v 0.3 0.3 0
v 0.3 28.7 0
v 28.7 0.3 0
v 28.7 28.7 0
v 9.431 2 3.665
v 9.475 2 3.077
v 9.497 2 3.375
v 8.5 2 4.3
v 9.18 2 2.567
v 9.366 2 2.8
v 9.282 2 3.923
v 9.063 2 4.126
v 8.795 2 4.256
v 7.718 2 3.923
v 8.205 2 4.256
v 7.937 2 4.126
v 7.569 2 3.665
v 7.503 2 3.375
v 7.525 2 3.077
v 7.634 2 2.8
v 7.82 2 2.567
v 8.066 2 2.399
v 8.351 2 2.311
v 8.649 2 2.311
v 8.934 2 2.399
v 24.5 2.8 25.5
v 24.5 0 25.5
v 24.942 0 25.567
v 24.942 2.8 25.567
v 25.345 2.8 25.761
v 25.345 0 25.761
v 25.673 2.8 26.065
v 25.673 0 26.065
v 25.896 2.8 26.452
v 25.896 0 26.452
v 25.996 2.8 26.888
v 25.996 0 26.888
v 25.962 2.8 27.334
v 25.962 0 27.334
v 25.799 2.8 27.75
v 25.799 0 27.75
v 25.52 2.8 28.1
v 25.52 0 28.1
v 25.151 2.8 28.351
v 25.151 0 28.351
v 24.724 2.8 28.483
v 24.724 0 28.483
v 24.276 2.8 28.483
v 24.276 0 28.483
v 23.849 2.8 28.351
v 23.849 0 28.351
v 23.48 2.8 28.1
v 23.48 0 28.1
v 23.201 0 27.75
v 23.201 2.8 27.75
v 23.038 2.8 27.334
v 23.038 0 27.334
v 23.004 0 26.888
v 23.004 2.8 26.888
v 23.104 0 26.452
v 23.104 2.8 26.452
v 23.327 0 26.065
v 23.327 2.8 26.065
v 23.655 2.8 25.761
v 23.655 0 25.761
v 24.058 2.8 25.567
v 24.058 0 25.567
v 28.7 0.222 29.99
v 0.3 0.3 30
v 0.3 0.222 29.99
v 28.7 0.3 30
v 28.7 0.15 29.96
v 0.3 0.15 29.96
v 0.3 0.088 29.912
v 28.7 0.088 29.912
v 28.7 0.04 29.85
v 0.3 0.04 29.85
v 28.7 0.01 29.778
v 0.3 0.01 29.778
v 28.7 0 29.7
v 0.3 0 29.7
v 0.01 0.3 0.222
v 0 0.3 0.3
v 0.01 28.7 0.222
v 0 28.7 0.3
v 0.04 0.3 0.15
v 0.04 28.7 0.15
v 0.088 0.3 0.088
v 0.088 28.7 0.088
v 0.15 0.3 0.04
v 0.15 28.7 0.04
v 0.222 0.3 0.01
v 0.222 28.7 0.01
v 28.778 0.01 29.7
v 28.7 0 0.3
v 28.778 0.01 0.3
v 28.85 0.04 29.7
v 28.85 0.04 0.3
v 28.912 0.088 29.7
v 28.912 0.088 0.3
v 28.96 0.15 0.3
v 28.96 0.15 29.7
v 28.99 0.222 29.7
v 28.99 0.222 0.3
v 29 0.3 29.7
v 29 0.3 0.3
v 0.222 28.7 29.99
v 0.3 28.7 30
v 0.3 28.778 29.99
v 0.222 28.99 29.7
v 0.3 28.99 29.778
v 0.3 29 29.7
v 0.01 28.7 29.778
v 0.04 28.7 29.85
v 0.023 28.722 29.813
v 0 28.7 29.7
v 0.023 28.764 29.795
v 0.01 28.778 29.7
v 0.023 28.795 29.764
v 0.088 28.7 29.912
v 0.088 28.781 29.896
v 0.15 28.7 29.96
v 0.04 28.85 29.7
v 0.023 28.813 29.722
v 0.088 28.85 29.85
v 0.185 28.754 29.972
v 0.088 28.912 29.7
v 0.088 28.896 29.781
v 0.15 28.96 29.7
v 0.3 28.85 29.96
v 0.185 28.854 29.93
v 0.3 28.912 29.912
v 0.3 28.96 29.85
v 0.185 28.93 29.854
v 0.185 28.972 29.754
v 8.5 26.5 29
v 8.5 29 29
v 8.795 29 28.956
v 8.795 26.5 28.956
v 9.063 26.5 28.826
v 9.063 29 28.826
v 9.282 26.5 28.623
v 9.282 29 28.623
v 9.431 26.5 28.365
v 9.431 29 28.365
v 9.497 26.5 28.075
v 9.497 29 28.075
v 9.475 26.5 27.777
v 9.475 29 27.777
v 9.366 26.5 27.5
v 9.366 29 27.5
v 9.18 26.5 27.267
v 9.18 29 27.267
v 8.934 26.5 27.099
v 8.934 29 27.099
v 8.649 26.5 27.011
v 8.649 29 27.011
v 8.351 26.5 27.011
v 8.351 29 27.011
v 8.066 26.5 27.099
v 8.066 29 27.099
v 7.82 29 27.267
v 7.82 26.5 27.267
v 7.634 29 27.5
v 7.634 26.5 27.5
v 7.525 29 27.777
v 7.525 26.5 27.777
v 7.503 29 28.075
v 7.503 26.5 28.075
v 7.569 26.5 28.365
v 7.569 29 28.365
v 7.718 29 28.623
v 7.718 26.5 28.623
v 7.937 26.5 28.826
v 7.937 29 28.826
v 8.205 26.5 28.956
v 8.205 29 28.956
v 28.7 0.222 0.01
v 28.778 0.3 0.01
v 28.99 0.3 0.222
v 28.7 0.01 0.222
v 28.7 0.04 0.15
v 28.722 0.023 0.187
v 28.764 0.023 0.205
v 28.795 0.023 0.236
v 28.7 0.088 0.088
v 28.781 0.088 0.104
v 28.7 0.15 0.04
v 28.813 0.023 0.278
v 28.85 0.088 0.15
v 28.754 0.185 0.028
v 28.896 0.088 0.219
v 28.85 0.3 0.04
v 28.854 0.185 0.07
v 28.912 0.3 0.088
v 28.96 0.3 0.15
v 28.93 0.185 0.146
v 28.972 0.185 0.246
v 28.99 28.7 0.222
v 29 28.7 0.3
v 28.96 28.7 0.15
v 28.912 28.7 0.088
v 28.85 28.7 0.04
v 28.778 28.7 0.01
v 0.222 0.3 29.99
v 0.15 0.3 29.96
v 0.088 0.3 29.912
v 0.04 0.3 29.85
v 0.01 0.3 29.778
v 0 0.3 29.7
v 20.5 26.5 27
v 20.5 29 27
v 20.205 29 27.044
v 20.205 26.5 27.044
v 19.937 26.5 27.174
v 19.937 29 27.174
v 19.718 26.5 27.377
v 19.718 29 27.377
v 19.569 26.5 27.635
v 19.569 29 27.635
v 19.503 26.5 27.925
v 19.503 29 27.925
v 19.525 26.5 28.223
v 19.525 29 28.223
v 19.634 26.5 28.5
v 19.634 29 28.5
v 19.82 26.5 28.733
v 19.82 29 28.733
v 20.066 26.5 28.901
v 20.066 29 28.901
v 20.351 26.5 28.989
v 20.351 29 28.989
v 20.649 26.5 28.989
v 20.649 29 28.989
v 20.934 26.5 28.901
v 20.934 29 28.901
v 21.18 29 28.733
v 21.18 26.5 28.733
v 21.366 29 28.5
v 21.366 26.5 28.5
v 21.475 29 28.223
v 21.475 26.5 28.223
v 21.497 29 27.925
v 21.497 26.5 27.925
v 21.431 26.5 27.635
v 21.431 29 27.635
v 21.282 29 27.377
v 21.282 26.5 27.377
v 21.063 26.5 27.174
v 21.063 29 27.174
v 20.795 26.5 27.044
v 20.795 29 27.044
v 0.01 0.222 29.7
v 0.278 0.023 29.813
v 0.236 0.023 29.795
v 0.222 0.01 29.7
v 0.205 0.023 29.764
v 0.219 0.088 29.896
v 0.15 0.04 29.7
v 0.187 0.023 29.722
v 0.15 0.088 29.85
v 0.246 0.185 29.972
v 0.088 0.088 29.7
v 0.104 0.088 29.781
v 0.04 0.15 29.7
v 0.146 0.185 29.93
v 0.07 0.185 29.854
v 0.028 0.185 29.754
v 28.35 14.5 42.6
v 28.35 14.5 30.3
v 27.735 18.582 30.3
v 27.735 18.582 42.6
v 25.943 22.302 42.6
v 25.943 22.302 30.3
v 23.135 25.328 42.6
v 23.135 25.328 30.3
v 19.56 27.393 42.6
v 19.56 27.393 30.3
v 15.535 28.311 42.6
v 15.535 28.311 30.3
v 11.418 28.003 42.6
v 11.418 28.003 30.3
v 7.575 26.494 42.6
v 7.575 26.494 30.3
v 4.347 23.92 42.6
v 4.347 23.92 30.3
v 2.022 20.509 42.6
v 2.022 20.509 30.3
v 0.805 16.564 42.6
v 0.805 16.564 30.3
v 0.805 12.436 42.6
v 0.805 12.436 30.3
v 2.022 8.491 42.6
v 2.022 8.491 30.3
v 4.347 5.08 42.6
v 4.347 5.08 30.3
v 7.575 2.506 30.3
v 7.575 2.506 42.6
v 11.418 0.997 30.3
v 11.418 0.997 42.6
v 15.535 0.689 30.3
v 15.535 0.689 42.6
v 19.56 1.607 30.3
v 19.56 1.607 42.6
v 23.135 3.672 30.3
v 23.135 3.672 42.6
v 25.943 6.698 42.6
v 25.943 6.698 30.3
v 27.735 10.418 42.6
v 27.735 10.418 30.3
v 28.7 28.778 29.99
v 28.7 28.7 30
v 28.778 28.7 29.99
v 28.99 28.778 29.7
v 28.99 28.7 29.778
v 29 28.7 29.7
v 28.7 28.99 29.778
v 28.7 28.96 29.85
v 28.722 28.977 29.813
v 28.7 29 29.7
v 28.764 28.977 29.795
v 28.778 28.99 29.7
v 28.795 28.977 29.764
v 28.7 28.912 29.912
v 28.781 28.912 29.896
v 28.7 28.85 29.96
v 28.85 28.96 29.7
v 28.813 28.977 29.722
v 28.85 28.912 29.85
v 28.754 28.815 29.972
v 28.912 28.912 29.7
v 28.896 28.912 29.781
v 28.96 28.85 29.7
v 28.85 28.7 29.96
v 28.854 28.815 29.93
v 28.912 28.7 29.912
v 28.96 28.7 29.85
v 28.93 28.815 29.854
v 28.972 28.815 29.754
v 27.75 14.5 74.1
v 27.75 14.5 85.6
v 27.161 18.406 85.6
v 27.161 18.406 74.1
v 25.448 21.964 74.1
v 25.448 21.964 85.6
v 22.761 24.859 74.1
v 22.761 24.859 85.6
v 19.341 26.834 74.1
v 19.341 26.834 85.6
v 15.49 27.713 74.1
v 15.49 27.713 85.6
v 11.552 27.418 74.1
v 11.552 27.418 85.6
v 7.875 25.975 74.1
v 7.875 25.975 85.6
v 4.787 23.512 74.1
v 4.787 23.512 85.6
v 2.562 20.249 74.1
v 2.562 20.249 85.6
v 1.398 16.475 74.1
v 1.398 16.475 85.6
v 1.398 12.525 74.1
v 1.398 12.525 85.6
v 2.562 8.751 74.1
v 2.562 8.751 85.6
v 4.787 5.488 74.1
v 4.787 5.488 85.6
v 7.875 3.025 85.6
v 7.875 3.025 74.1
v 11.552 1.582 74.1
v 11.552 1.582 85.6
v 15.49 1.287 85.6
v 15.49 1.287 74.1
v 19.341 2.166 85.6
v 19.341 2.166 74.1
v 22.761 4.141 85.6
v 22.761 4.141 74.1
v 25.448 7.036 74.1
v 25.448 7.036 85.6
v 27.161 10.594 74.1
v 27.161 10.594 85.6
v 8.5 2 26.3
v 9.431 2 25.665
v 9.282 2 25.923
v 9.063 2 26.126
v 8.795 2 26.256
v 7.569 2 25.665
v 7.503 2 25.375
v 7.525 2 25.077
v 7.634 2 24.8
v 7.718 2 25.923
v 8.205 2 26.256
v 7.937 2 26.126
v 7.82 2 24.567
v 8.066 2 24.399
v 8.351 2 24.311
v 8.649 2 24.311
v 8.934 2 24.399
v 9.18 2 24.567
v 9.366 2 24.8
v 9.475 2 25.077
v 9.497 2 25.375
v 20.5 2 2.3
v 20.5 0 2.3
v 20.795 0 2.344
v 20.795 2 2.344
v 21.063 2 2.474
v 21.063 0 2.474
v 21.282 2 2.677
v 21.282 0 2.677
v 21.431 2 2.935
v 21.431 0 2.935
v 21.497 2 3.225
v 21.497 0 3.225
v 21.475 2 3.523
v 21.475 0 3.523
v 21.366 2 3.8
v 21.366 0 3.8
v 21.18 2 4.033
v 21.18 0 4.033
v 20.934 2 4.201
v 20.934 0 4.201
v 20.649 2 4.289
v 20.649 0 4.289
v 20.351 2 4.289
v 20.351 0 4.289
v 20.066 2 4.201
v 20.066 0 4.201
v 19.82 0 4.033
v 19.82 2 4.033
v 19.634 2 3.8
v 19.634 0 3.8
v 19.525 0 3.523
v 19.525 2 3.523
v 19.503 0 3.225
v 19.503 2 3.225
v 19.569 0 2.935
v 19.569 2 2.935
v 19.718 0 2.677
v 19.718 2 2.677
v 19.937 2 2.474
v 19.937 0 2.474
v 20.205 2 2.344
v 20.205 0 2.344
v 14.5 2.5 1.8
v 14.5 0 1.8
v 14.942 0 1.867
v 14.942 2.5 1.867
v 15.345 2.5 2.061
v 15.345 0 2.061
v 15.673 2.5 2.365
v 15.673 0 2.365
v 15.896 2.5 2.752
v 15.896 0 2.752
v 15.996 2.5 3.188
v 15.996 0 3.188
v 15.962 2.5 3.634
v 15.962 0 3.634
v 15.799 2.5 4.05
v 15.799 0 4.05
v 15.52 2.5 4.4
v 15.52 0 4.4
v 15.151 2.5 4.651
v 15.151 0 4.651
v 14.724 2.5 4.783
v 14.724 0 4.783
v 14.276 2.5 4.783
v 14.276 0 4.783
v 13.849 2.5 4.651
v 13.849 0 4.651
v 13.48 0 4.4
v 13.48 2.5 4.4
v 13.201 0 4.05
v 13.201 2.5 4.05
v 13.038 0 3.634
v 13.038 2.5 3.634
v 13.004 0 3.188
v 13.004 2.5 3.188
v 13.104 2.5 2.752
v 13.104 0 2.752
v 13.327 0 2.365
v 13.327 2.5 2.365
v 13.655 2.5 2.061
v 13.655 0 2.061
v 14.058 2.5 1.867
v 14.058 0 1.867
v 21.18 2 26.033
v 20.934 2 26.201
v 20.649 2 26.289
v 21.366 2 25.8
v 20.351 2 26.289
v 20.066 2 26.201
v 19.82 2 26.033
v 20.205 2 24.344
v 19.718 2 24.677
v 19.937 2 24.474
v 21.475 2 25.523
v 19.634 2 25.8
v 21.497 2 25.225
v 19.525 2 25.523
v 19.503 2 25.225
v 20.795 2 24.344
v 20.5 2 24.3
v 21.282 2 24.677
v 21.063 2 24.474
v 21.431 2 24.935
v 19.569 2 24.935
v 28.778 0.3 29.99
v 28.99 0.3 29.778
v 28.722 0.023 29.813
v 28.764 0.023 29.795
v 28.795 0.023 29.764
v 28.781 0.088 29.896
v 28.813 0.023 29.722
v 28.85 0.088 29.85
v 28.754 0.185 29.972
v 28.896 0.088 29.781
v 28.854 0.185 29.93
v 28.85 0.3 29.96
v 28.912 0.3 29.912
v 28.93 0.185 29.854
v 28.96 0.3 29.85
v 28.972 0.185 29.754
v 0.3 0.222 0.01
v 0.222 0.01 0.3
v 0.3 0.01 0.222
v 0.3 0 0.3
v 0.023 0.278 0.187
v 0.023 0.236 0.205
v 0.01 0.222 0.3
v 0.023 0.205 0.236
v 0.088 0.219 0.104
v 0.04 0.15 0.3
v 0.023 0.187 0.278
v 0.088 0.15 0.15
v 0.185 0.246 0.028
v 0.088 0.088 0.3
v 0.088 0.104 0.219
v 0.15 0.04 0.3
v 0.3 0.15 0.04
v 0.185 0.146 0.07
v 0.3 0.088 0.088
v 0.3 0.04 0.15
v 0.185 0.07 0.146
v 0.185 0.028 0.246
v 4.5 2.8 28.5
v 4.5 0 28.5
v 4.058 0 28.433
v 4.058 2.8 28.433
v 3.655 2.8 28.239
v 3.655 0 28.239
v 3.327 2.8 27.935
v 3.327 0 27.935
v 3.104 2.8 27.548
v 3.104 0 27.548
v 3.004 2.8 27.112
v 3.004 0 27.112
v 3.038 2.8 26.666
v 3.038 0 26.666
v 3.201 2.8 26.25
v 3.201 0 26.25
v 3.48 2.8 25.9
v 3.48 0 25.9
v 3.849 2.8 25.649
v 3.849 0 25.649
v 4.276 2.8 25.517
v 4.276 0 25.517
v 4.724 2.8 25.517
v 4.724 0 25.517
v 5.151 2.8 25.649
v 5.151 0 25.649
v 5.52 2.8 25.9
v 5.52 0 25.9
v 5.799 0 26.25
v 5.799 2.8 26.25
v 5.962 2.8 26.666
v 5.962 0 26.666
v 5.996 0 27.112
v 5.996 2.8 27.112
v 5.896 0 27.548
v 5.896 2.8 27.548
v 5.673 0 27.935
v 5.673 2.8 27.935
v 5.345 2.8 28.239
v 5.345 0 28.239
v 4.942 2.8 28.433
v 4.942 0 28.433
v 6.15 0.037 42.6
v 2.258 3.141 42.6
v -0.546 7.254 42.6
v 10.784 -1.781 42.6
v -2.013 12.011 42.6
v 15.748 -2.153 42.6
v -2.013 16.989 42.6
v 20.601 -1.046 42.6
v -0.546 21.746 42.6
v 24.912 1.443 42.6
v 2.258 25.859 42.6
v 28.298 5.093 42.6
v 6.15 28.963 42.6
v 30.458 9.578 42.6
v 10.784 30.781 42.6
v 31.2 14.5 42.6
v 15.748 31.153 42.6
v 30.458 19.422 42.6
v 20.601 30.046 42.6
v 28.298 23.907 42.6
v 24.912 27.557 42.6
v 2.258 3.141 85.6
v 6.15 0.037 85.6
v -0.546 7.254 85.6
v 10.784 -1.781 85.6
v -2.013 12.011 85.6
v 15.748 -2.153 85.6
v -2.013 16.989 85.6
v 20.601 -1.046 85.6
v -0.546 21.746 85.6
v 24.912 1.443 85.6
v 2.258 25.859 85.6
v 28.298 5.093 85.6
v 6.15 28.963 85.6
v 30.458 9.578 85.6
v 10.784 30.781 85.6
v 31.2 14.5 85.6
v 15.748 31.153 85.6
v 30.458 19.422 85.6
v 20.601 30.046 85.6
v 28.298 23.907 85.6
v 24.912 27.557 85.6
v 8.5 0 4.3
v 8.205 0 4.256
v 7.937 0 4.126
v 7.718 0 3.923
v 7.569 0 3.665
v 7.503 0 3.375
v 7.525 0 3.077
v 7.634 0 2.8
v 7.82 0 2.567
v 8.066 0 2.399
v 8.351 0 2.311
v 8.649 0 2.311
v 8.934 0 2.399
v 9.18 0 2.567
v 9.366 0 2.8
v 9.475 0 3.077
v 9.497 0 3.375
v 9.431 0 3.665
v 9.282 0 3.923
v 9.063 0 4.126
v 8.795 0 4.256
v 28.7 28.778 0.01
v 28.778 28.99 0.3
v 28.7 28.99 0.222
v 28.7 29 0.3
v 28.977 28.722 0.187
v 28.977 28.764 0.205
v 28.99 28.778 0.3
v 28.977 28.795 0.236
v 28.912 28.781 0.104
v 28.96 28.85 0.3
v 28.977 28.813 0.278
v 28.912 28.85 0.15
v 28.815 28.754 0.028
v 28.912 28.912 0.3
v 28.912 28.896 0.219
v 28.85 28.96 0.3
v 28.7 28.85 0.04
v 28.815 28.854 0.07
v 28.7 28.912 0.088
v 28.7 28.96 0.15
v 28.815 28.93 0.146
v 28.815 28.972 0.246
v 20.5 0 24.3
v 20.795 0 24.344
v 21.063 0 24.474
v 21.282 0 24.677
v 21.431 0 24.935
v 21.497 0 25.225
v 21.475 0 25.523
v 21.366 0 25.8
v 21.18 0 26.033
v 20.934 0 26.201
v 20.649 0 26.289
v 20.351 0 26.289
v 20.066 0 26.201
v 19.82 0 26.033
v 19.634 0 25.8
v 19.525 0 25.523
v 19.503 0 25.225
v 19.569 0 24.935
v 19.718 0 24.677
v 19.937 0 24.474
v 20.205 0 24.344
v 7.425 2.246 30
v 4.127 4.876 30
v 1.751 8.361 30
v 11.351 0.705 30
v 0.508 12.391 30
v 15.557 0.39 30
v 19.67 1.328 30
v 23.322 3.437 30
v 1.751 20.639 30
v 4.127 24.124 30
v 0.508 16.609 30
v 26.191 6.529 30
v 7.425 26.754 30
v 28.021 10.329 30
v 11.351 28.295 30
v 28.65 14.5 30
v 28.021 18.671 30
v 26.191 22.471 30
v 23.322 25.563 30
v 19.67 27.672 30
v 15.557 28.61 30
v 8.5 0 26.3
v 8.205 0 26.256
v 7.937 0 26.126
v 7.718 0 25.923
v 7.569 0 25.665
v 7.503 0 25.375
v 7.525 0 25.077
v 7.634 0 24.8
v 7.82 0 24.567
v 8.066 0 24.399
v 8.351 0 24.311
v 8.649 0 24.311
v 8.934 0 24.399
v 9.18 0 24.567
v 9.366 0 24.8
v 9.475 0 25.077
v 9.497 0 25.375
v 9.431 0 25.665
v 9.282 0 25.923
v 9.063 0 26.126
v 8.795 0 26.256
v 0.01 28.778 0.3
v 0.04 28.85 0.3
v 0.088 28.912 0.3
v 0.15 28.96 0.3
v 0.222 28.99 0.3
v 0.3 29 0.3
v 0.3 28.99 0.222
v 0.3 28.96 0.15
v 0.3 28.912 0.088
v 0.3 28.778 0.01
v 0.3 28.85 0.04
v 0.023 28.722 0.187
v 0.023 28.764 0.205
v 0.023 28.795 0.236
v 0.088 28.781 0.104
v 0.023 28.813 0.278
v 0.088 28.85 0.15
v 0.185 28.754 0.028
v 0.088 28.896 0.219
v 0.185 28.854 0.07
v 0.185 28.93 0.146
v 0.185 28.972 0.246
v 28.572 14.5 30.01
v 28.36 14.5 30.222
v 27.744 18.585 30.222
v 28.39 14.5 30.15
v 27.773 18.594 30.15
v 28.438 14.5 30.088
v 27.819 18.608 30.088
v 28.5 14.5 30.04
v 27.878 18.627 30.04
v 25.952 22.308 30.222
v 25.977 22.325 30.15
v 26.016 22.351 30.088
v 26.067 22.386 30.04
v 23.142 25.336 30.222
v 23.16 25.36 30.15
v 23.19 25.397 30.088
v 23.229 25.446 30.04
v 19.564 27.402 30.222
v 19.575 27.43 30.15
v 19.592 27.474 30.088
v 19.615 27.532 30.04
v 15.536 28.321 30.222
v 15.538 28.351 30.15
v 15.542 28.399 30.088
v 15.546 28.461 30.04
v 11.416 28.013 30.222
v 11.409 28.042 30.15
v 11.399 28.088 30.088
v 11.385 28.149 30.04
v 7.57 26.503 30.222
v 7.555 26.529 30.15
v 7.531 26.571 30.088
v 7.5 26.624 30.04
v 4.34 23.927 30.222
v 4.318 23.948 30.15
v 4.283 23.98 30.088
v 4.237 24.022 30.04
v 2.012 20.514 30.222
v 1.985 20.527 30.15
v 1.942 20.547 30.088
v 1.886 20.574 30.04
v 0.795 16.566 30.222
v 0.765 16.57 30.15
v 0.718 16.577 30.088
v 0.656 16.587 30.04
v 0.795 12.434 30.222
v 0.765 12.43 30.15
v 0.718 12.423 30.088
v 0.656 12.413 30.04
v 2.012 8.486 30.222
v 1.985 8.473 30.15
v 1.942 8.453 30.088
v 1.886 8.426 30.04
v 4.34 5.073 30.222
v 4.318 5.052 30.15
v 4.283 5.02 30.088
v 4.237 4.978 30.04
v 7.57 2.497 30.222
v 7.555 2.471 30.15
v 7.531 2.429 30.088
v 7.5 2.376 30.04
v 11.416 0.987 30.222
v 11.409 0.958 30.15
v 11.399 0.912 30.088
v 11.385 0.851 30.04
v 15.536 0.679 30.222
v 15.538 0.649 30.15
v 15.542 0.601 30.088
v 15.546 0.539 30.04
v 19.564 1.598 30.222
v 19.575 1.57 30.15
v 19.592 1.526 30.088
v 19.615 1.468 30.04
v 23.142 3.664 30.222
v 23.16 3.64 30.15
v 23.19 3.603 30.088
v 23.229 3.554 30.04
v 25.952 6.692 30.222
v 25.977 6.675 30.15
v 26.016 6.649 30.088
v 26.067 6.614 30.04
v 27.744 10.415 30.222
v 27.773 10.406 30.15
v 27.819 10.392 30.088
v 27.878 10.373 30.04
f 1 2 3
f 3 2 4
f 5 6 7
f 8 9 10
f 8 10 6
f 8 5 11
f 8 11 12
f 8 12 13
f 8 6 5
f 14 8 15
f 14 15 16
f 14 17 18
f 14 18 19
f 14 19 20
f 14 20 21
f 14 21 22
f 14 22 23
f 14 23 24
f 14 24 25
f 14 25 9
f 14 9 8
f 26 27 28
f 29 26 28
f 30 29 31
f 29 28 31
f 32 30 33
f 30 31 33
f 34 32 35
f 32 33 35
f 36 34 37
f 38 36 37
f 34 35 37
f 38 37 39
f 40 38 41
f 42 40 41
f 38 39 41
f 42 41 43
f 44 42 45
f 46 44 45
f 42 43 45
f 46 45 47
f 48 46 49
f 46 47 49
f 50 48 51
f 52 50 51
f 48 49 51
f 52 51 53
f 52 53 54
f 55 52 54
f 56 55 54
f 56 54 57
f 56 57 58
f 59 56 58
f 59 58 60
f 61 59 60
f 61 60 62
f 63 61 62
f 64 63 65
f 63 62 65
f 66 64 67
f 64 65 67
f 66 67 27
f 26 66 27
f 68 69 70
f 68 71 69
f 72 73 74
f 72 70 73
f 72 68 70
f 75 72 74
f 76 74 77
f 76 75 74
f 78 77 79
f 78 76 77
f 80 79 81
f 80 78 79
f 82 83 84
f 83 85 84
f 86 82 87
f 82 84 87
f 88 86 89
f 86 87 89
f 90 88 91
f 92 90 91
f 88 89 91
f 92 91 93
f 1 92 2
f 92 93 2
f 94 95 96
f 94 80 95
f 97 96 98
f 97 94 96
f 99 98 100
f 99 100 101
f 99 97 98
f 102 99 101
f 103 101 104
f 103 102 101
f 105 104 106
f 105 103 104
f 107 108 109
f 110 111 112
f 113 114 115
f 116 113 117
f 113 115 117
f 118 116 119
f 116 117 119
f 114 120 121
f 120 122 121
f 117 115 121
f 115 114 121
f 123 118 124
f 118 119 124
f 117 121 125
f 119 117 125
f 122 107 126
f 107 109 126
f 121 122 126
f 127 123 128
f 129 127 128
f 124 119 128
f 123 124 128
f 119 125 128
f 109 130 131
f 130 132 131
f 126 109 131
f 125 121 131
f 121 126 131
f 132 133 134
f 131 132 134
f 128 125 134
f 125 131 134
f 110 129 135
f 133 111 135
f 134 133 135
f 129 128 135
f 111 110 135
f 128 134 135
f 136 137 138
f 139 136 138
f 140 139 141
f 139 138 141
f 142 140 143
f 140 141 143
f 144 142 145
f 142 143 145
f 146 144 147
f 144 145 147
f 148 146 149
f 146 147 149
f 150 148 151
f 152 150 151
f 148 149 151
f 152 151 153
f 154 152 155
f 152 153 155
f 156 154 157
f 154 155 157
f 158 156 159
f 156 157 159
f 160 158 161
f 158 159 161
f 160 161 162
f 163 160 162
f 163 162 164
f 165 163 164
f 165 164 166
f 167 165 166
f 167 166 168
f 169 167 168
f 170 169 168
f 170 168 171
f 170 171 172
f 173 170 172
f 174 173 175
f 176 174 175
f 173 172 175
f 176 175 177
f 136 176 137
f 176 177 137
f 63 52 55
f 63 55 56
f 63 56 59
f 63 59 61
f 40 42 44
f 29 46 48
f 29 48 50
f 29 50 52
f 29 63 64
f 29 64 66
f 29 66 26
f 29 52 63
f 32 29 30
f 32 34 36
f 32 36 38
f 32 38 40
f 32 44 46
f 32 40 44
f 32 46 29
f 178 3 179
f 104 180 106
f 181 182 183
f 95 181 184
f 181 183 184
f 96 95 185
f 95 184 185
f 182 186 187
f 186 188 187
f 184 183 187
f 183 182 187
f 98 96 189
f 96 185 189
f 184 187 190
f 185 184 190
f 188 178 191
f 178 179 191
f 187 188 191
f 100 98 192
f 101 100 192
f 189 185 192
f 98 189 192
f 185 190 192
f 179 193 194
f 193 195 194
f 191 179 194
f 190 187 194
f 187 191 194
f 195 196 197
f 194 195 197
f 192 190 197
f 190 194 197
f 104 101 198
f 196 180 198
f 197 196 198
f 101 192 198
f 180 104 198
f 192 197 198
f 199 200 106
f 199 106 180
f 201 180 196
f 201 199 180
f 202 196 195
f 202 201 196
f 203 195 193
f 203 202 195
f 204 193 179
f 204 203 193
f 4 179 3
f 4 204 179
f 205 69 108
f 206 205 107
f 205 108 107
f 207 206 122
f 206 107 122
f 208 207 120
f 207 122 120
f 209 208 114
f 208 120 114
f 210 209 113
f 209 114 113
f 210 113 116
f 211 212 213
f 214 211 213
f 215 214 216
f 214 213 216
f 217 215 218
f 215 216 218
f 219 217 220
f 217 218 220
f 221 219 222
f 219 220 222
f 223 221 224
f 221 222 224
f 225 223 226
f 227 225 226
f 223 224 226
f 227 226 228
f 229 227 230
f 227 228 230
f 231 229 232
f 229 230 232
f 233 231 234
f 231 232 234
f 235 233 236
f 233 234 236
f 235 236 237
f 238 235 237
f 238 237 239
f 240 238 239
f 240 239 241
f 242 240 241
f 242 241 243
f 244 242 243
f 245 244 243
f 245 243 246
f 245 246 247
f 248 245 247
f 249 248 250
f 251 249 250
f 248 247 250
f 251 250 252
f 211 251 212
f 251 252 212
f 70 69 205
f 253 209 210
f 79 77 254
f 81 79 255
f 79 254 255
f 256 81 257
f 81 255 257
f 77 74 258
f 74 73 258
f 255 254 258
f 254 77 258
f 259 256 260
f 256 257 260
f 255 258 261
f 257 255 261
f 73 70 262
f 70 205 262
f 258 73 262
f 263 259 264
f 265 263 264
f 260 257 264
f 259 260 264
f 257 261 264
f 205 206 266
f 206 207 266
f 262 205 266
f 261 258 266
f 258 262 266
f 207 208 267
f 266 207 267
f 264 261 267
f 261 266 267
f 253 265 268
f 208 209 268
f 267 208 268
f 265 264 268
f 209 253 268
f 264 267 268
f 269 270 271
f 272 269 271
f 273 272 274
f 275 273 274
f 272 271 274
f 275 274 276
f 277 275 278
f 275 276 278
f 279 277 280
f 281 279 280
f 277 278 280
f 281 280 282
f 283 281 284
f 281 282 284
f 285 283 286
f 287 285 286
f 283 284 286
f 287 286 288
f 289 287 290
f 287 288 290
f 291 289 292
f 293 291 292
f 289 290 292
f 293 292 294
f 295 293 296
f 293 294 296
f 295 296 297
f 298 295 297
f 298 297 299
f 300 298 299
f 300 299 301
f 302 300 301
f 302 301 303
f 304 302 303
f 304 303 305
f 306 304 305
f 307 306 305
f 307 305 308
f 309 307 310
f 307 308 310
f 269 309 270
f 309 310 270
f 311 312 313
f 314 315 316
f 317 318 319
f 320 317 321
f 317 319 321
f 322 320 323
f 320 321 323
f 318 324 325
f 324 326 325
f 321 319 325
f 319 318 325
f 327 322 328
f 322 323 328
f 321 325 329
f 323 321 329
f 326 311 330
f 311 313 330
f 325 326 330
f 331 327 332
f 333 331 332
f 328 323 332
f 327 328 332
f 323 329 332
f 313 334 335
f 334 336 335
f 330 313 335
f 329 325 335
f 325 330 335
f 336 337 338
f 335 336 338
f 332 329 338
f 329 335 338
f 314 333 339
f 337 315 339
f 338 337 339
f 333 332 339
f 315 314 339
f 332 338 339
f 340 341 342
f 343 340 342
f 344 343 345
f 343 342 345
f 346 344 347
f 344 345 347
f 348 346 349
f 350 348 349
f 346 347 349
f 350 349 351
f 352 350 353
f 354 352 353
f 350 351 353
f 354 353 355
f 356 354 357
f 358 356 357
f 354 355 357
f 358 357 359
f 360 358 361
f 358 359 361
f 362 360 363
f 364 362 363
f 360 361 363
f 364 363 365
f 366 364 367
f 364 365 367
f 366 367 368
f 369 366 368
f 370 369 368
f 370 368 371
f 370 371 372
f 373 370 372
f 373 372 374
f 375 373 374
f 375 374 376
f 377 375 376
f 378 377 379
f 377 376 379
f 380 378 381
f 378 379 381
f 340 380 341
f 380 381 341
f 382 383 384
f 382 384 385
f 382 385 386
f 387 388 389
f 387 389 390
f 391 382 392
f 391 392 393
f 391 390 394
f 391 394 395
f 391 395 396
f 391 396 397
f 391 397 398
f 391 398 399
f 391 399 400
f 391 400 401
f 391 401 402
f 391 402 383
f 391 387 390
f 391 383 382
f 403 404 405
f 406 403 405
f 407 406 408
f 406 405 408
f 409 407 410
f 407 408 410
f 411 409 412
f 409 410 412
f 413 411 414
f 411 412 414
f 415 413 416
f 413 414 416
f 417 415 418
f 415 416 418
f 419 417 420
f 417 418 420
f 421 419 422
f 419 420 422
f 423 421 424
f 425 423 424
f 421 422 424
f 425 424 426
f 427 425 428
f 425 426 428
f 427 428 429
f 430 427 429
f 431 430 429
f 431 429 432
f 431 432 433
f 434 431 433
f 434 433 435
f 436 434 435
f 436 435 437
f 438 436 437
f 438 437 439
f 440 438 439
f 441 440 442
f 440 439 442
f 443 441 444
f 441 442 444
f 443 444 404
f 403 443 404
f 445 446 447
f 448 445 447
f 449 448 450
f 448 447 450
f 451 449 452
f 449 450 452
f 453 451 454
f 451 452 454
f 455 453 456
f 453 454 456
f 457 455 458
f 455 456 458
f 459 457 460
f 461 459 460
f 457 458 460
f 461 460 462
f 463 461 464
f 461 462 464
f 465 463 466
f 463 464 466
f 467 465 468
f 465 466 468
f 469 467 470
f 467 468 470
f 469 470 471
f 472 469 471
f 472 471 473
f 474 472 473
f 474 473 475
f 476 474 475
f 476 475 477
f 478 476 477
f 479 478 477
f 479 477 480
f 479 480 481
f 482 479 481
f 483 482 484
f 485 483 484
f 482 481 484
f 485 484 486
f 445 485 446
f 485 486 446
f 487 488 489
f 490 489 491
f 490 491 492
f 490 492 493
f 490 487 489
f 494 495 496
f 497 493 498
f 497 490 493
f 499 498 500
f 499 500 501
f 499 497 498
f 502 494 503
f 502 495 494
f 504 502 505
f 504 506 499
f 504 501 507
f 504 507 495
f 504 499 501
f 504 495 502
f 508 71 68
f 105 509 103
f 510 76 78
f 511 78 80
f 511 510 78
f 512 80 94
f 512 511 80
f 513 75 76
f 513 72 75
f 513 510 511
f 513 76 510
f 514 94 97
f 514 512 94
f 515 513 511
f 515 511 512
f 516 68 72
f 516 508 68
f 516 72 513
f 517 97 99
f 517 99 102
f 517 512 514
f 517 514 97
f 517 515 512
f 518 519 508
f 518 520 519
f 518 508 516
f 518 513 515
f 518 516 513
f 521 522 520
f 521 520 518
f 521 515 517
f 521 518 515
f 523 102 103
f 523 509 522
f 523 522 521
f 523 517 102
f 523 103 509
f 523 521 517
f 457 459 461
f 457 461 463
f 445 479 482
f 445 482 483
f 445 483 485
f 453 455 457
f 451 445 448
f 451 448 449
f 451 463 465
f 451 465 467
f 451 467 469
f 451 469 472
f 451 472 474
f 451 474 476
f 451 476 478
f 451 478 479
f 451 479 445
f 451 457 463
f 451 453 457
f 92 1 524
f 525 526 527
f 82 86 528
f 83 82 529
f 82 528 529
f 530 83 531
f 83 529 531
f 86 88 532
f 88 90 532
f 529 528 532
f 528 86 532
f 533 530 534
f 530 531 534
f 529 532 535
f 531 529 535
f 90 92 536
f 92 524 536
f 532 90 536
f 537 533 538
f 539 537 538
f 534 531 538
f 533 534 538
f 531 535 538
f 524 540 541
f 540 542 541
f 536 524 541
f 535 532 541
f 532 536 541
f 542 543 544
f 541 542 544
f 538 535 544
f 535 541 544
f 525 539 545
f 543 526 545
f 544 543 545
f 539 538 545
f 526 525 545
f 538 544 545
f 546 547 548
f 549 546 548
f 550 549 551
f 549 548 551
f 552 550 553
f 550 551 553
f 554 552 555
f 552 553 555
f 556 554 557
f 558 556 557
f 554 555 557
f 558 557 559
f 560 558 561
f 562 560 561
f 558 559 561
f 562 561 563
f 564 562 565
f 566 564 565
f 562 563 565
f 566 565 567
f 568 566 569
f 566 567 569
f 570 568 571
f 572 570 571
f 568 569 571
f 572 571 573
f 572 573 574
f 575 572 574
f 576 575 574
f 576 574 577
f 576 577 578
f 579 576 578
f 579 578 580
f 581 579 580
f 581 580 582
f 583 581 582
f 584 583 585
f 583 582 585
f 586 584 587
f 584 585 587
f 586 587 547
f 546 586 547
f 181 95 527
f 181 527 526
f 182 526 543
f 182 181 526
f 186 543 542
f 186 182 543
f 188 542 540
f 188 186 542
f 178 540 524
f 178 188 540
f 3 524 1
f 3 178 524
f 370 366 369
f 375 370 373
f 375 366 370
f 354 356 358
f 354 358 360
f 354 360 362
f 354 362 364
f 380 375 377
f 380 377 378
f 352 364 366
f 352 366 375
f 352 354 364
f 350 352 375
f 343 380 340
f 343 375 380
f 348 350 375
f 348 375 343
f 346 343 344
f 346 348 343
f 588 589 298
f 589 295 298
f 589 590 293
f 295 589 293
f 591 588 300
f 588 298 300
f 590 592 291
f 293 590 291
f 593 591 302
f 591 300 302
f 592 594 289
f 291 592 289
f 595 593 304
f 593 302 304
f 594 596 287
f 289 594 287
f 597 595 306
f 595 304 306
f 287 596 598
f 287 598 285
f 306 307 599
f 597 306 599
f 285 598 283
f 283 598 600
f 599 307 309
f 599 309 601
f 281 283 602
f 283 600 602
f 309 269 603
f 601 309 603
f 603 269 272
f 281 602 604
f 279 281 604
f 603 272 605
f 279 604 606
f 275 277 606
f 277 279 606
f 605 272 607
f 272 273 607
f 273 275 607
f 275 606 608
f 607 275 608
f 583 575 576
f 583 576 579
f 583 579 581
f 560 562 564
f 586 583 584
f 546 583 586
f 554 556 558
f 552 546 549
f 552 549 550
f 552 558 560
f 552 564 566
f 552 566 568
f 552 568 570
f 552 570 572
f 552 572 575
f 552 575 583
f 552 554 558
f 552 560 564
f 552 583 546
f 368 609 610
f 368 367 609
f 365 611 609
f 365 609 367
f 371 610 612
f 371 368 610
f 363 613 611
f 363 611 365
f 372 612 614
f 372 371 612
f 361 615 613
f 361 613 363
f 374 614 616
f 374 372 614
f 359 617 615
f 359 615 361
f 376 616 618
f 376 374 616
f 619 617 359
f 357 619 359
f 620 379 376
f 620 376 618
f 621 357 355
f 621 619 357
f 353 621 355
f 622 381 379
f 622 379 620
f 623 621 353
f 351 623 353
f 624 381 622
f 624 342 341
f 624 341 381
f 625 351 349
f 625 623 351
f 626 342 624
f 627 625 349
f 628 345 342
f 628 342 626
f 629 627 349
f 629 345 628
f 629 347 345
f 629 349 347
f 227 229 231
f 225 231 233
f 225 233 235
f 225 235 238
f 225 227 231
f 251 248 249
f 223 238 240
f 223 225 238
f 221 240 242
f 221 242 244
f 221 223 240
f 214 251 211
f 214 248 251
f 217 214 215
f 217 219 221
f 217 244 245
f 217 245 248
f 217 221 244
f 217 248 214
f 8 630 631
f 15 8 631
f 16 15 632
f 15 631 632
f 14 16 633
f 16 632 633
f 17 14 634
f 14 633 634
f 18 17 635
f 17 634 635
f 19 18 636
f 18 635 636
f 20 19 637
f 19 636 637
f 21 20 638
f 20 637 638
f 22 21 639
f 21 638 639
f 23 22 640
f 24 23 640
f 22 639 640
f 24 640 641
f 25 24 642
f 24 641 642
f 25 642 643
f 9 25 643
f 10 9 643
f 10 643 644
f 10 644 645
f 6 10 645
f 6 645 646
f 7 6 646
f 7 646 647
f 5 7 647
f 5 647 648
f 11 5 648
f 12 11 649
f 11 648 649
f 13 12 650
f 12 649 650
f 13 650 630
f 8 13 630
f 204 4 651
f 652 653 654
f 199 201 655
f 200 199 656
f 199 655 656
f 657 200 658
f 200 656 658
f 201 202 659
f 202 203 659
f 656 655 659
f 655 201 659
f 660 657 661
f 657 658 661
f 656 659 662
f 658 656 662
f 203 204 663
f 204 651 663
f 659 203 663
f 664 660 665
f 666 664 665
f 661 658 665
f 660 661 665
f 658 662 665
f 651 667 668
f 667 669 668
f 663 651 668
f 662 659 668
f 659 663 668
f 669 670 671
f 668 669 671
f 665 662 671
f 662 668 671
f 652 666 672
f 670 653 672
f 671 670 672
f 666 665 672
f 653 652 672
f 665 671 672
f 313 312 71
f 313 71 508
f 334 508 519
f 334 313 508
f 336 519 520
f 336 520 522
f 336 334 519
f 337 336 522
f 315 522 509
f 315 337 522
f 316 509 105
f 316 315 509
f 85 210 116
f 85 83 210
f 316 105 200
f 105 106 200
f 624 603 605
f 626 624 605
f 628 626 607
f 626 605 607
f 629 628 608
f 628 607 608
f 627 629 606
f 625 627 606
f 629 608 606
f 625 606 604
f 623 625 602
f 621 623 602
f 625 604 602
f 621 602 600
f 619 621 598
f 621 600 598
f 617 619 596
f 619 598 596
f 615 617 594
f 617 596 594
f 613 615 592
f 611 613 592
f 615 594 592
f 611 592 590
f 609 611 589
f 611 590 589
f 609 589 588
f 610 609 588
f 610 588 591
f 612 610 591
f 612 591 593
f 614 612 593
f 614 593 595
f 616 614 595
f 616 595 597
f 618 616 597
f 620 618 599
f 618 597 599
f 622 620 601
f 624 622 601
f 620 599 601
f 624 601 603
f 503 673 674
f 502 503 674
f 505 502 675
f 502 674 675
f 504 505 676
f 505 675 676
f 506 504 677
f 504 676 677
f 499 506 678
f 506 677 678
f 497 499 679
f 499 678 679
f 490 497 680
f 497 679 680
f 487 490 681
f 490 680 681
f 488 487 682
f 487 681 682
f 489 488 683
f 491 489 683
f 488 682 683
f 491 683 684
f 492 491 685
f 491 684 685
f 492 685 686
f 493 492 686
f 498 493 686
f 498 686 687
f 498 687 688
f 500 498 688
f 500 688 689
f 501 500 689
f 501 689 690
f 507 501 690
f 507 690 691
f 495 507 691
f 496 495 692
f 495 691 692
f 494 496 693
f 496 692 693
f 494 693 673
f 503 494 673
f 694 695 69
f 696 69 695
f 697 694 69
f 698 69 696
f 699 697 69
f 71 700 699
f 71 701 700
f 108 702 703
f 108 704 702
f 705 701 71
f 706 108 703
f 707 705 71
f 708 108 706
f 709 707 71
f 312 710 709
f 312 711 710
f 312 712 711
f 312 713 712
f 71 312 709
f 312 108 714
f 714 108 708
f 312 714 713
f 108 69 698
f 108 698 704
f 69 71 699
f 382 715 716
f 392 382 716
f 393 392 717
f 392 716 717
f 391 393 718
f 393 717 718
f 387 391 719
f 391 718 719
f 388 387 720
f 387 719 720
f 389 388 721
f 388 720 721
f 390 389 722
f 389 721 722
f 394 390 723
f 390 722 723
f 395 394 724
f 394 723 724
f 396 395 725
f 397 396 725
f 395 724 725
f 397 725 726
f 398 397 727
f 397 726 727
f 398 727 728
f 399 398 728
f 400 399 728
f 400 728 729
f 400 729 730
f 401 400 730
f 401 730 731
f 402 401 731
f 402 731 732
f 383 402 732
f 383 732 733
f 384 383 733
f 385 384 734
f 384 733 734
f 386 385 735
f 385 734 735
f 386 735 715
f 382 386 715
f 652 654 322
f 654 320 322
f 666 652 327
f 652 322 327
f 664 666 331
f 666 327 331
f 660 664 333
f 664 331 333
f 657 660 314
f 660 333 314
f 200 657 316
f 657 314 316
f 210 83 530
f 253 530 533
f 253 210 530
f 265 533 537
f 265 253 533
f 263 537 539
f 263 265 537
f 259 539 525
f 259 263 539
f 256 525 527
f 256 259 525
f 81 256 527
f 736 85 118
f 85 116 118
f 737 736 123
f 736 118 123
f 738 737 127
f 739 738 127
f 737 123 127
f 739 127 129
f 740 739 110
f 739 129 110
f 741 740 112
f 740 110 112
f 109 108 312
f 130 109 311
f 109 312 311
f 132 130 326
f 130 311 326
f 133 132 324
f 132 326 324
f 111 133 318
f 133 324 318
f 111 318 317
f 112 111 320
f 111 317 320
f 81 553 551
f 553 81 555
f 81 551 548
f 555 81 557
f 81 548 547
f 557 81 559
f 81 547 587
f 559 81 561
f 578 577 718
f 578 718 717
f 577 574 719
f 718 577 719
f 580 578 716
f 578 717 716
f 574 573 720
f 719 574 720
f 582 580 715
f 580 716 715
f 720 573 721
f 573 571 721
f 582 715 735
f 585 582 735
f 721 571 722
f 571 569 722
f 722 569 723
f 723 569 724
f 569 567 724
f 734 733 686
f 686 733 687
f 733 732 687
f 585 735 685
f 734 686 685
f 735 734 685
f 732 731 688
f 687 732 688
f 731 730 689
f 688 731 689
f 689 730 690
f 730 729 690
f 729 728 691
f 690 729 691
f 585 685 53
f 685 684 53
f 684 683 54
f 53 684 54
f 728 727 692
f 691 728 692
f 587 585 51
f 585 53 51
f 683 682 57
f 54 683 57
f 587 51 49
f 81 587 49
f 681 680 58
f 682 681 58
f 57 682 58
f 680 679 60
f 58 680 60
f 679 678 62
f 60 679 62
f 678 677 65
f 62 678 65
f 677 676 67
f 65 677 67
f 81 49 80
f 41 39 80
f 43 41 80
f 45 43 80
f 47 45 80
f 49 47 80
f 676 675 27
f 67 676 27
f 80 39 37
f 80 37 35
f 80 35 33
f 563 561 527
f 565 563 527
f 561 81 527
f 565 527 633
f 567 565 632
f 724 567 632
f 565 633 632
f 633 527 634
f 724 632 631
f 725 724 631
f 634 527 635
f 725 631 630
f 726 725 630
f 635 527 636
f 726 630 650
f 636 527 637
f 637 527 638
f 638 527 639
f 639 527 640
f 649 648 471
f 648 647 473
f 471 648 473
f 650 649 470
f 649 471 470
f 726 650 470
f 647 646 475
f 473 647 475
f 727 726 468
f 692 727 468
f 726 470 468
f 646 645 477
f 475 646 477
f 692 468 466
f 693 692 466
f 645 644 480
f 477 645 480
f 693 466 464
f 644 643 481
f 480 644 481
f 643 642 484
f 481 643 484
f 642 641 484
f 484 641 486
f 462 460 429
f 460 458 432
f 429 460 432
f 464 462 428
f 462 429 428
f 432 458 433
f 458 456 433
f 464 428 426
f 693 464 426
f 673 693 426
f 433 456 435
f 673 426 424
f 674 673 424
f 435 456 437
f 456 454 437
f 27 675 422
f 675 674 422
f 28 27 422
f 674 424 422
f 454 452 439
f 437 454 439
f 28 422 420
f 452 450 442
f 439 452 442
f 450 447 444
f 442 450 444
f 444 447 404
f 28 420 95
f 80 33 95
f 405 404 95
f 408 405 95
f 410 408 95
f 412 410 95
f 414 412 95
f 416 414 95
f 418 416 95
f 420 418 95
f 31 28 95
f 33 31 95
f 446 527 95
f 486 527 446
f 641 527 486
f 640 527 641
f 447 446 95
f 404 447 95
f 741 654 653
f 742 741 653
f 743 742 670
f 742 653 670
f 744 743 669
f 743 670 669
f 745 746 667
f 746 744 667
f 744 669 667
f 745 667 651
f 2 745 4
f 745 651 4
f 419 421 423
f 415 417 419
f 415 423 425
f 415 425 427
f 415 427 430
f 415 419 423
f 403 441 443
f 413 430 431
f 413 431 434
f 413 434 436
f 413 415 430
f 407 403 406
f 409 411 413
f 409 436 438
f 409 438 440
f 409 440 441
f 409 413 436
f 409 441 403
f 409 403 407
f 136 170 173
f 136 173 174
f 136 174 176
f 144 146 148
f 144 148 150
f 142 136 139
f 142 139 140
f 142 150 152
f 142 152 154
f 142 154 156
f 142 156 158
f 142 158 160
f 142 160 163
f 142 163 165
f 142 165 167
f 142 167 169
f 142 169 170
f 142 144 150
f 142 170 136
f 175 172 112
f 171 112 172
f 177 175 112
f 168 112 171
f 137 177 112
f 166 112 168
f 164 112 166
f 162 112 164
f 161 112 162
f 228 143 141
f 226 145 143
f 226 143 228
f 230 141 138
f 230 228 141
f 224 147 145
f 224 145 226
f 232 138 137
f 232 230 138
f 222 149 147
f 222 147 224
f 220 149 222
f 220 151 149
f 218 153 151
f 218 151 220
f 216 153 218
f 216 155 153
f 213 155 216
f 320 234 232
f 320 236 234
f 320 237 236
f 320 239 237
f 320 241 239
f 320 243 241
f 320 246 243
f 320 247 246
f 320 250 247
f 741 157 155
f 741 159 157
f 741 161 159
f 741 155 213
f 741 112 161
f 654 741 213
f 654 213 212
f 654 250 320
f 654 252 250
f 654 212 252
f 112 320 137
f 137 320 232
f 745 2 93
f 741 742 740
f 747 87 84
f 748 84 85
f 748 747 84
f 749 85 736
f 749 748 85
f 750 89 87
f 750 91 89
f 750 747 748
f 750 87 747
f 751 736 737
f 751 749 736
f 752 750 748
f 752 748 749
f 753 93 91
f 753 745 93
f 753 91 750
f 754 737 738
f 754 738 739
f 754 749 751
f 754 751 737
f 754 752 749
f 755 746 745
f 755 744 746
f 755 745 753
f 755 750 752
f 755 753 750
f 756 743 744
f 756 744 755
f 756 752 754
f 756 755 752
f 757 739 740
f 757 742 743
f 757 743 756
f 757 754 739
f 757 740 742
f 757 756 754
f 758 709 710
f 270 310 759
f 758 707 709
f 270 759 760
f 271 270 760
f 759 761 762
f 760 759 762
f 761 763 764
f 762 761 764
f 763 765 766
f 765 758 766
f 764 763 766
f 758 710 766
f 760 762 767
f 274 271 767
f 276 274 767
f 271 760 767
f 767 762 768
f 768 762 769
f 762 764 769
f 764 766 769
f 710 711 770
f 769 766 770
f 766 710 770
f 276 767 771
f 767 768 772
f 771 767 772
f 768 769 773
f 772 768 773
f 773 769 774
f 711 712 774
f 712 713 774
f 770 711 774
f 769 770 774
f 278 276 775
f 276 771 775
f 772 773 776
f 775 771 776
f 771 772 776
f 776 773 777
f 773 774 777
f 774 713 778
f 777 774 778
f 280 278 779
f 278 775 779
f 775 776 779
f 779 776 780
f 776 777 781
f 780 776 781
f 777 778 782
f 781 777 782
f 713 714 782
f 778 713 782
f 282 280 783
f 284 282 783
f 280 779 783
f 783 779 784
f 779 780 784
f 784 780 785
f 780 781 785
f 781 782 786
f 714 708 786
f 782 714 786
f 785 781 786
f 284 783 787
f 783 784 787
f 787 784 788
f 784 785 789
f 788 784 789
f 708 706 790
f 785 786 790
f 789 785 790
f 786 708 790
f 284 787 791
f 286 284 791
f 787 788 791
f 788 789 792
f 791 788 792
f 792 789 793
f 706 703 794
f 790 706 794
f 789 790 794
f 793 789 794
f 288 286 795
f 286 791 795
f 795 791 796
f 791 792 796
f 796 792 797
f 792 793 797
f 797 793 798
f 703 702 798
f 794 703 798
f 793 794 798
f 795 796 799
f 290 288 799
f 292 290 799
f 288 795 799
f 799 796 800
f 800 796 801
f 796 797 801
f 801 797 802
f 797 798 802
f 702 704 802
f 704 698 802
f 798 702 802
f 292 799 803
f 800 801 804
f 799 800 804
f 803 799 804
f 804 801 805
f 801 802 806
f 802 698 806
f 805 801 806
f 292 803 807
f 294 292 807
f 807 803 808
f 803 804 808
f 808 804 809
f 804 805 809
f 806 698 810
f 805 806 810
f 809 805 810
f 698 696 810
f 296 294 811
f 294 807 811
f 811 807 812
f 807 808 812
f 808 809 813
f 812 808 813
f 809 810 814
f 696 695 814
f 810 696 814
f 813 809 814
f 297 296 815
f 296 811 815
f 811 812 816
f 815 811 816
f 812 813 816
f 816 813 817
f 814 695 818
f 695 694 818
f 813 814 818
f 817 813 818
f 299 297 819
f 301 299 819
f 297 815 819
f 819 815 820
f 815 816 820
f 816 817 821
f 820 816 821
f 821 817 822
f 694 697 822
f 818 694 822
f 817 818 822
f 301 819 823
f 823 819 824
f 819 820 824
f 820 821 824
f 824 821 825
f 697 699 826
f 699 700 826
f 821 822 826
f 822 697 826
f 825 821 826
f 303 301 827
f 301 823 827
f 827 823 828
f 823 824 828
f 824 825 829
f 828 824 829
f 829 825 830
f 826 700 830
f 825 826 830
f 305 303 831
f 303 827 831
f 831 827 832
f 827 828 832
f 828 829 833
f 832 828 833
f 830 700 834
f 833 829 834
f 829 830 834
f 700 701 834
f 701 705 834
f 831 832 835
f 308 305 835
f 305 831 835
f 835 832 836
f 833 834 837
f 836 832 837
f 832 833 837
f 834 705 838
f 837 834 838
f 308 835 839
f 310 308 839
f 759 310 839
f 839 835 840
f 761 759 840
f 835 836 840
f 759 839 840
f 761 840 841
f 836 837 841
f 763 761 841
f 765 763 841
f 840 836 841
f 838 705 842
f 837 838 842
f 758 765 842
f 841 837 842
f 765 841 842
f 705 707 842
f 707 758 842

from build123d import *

# Parameters (mm, degrees)
SKETCH1_W           = 29
SKETCH1_H           = 29
BOSS_EXTRUDE1_DEPTH = 30
SKETCH2_R           = 1
CUT_EXTRUDE1_DEPTH  = 2.5
SKETCH3_R           = 1.5
CUT_EXTRUDE2_DEPTH  = 2.8
SKETCH4_R           = 1.5
CUT_EXTRUDE3_DEPTH  = 2.5
SKETCH5_R           = 1
CUT_EXTRUDE4_DEPTH  = 2
SKETCH6_R           = 13.85
BOSS_EXTRUDE2_DEPTH = 12.6
SKETCH7_R           = 16.7
BOSS_EXTRUDE3_DEPTH = 43
FILLET1_R           = 0.3
SKETCH8_R           = 13.25
CUT_EXTRUDE5_DEPTH  = 11.5


with BuildPart() as part:
    # Sketch1 → Boss-Extrude1 (new body)
    with BuildSketch(Plane.XY):
        with Locations((14.5, 14.5)):
            Rectangle(SKETCH1_W, SKETCH1_H)
    extrude(amount=BOSS_EXTRUDE1_DEPTH)

    # Sketch2 → Cut-Extrude1 (cut)
    with BuildSketch(Plane(origin=(0, 29, 0), x_dir=(1, 0, 0), z_dir=(0, 1, 0))):
        with Locations(Location((8.5, -28, 0), (0, 0, 270))):
            Circle(SKETCH2_R)
        with Locations(Location((20.5, -28, 0), (0, 0, 90))):
            Circle(SKETCH2_R)
    extrude(amount=-CUT_EXTRUDE1_DEPTH, mode=Mode.SUBTRACT)

    # Sketch3 → Cut-Extrude2 (cut)
    with BuildSketch(Plane.XZ):
        with Locations(Location((24.5, 27, 0), (0, 0, 270))):
            Circle(SKETCH3_R)
        with Locations(Location((4.5, 27, 0), (0, 0, 90))):
            Circle(SKETCH3_R)
    extrude(amount=-CUT_EXTRUDE2_DEPTH, mode=Mode.SUBTRACT)

    # Sketch4 → Cut-Extrude3 (cut)
    with BuildSketch(Plane.XZ):
        with Locations(Location((14.5, 3.3, 0), (0, 0, 270))):
            Circle(SKETCH4_R)
    extrude(amount=-CUT_EXTRUDE3_DEPTH, mode=Mode.SUBTRACT)

    # Sketch5 → Cut-Extrude4 (cut)
    with BuildSketch(Plane.XZ):
        with Locations(Location((20.5, 25.3, 0), (0, 0, 270))):
            Circle(SKETCH5_R)
        with Locations(Location((20.5, 3.3, 0), (0, 0, 270))):
            Circle(SKETCH5_R)
        with Locations(Location((8.5, 3.3, 0), (0, 0, 90))):
            Circle(SKETCH5_R)
        with Locations(Location((8.5, 25.3, 0), (0, 0, 90))):
            Circle(SKETCH5_R)
    extrude(amount=-CUT_EXTRUDE4_DEPTH, mode=Mode.SUBTRACT)

    # Sketch6 → Boss-Extrude2 (add)
    with BuildSketch(Plane.XY.offset(30)):
        with Locations((14.5, 14.5)):
            Circle(SKETCH6_R)
    extrude(amount=BOSS_EXTRUDE2_DEPTH)

    # Sketch7 → Boss-Extrude3 (add)
    with BuildSketch(Plane.XY.offset(42.6)):
        with Locations((14.5, 14.5)):
            Circle(SKETCH7_R)
    extrude(amount=BOSS_EXTRUDE3_DEPTH)

    # Fillet1
    fillet1_edges = [part.edges().sort_by_distance(p)[0] for p in [
        (29, 14.5, 30),
        (14.5, 29, 30),
        (0, 14.5, 30),
        (14.5, 29, 0),
        (0.65, 14.5, 30),
        (29, 14.5, 0),
        (14.5, 0, 0),
        (0, 14.5, 0),
        (14.5, 0, 30),
        (0, 29, 15),
        (29, 29, 15),
        (29, 0, 15),
        (0, 0, 15),
    ]]
    fillet(fillet1_edges, radius=FILLET1_R)

    # Sketch8 → Cut-Extrude5 (cut)
    with BuildSketch(Plane.XY.offset(85.6)):
        with Locations((14.5, 14.5)):
            Circle(SKETCH8_R)
    extrude(amount=-CUT_EXTRUDE5_DEPTH, mode=Mode.SUBTRACT)


solid = part.part
